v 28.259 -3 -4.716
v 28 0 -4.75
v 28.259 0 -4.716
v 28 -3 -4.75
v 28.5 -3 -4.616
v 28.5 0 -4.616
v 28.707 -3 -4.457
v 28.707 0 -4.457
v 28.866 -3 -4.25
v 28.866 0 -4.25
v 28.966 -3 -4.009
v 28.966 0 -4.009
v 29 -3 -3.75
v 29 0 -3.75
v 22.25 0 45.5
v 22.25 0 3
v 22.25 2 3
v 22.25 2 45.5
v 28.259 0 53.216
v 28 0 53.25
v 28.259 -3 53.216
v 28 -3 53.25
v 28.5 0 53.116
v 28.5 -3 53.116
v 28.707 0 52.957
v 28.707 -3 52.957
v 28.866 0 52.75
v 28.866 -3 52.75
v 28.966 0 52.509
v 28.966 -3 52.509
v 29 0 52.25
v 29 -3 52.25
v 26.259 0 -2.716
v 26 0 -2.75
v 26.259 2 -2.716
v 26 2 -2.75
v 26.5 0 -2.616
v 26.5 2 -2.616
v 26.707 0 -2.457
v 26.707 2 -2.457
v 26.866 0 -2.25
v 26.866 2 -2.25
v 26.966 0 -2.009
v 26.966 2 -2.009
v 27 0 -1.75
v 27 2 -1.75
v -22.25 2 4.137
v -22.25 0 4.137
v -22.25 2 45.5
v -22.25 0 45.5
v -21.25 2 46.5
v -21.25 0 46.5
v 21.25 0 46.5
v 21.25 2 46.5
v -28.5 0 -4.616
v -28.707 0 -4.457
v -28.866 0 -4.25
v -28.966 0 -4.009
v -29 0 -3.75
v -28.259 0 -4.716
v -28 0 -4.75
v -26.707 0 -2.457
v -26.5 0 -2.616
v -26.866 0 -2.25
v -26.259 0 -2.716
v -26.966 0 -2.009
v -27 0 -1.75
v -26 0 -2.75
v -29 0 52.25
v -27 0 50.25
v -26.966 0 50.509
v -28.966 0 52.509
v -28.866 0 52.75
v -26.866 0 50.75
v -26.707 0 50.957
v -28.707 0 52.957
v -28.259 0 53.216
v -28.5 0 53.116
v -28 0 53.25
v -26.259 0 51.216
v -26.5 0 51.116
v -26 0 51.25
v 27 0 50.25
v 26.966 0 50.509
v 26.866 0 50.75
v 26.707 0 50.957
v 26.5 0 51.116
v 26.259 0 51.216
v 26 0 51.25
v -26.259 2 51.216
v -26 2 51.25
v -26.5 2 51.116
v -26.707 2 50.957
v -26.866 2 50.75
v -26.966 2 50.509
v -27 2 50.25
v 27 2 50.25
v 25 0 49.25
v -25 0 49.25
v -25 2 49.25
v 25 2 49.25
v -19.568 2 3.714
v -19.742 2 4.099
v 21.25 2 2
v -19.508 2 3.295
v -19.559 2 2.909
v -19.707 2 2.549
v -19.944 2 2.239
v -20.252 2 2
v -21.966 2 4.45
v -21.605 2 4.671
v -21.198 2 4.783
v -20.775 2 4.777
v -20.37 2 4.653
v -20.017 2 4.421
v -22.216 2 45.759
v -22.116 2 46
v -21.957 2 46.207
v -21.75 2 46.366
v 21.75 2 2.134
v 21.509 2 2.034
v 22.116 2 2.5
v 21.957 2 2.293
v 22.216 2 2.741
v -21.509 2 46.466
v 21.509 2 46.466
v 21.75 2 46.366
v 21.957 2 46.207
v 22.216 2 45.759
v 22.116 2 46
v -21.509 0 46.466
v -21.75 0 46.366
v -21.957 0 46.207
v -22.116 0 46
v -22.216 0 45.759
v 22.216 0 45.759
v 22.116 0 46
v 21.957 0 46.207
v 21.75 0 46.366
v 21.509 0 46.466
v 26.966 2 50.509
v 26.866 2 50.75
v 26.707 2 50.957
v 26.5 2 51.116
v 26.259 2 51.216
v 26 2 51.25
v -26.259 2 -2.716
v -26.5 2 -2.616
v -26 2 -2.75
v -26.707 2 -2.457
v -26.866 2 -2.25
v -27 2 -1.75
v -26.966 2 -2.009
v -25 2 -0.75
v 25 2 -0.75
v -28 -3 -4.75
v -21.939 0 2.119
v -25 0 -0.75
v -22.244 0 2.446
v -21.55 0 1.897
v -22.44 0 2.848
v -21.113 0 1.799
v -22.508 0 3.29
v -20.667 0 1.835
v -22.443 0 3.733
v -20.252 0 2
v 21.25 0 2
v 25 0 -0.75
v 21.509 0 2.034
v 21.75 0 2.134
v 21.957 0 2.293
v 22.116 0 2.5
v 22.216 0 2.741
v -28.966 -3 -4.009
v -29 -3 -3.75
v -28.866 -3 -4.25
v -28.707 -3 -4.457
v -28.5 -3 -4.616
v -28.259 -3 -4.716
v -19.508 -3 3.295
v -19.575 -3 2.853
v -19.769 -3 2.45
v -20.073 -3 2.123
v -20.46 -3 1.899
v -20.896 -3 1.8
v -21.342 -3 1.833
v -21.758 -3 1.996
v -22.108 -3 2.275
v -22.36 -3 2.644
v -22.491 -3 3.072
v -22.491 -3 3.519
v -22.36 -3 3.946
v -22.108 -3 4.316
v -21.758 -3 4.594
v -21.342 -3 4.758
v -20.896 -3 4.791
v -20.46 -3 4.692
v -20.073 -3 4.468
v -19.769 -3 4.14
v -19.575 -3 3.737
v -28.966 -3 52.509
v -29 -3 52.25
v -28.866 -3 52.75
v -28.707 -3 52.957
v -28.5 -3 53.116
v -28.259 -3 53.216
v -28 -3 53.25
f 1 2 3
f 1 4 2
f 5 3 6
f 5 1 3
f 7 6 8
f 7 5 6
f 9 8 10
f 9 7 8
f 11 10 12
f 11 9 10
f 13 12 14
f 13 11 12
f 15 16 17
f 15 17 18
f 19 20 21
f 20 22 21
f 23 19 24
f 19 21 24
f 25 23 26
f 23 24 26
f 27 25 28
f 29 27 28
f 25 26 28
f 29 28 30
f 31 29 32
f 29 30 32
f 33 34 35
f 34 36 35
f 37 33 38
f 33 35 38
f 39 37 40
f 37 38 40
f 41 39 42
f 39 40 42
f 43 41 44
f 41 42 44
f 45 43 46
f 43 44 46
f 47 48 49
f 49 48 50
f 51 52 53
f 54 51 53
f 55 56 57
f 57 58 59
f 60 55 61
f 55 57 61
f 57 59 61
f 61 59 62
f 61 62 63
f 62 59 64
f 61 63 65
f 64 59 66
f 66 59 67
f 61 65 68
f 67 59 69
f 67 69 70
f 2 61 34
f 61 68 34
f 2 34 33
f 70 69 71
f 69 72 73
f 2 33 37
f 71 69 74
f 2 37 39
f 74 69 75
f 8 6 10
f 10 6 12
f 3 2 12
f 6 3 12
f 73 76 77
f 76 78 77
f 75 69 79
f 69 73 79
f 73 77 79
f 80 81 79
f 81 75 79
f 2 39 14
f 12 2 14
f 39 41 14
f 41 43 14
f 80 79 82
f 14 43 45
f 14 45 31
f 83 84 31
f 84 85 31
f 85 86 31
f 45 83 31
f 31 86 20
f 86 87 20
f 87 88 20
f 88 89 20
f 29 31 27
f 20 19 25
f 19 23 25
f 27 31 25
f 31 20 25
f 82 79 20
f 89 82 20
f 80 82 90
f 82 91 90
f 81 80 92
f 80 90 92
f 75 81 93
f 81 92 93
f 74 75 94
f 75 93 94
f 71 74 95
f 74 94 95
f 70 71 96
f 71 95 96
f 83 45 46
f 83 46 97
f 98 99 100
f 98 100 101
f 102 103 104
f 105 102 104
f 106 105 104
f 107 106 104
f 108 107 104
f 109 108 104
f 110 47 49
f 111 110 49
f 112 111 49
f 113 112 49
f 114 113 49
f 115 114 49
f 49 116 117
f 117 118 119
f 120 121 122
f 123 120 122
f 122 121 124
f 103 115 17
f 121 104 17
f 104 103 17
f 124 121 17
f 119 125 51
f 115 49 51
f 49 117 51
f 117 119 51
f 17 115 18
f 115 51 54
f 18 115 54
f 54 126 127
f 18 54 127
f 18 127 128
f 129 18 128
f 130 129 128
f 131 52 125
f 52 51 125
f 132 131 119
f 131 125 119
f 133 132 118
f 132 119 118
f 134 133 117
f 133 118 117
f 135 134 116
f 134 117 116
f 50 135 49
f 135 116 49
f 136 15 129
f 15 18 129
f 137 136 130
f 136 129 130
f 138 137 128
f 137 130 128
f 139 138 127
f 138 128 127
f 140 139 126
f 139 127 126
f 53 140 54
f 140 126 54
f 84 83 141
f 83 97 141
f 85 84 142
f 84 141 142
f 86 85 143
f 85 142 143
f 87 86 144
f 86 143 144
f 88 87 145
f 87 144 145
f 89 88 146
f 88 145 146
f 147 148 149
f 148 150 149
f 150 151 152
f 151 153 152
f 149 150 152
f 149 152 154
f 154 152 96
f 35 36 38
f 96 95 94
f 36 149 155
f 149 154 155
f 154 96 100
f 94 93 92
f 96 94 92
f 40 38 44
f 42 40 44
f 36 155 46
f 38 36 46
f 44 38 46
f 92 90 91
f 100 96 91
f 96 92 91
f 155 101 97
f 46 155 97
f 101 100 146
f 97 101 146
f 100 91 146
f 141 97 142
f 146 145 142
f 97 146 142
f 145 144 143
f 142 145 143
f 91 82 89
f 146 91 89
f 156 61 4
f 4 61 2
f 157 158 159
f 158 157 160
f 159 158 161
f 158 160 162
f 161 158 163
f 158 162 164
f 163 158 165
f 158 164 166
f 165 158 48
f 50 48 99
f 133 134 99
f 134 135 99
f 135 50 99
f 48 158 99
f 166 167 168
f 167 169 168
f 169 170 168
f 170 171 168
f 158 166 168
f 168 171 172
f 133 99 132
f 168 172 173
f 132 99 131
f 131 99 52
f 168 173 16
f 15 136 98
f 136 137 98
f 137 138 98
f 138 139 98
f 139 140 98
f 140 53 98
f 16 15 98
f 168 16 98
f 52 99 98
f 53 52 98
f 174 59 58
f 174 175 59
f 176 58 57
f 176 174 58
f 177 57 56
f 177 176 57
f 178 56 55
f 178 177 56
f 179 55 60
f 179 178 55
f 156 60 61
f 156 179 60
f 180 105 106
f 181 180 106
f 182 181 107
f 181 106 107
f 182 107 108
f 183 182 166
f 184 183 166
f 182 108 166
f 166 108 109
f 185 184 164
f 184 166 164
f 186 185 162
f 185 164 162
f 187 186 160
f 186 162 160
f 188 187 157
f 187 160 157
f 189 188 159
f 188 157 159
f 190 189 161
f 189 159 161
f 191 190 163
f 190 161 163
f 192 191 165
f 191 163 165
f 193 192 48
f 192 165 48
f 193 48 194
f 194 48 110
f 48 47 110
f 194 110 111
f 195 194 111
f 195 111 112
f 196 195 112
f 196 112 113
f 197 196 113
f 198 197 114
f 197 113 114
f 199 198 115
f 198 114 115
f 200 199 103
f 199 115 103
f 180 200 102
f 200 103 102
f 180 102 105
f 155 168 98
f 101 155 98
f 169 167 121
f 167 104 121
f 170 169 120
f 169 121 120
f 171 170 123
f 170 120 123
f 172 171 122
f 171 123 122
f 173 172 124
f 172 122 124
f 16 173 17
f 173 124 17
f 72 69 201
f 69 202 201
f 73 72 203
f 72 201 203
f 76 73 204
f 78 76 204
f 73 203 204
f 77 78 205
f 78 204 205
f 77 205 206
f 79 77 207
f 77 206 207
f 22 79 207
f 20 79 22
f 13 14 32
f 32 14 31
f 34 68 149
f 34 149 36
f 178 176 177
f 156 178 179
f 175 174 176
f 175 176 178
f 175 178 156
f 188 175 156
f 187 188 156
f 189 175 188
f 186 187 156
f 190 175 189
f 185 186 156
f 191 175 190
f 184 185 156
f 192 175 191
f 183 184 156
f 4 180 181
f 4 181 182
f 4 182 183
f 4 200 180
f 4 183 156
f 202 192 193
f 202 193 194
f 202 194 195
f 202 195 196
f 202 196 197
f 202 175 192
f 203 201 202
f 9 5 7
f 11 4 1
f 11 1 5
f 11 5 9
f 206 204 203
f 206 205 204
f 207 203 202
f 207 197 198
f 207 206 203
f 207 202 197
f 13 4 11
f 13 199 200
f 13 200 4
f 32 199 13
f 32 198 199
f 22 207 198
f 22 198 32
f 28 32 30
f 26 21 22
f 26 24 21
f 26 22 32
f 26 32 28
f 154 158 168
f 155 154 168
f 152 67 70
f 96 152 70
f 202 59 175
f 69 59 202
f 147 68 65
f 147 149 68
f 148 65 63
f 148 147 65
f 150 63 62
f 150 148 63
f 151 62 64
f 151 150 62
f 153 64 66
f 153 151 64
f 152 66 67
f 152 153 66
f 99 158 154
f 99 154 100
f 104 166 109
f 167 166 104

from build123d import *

# Parameters (mm, degrees)
SKETCH005_W   = 54
SKETCH005_H   = 54
SKETCH005_W_2 = 50
SKETCH005_H_2 = 50
SKETCH005_W_3 = 44.5
SKETCH005_H_3 = 44.5
PAD002_DEPTH  = 2
SKETCH006_W   = 58
SKETCH006_H   = 58
PAD003_DEPTH  = 3
FILLET_R      = 1
SKETCH007_R   = 1.5
POCKET_DEPTH  = 5.001


with BuildPart() as part:
    # Sketch005 → Pad002 (new body)
    with BuildSketch(Plane.XZ):
        with Locations((0, 24.25)):
            Rectangle(SKETCH005_W, SKETCH005_H)
        with Locations((0, 24.25)):
            Rectangle(SKETCH005_W_2, SKETCH005_H_2, mode=Mode.SUBTRACT)
        with Locations((0, 24.25)):
            Rectangle(SKETCH005_W_3, SKETCH005_H_3)
    extrude(amount=-PAD002_DEPTH)

    # Sketch006 (on Face15 of Pad002) → Pad003 (join)
    with BuildSketch(Plane.XZ):
        with Locations((0, 24.25)):
            Rectangle(SKETCH006_W, SKETCH006_H)
    extrude(amount=PAD003_DEPTH)

    # Fillet
    fillet_edges = [part.edges().sort_by_distance(p)[0] for p in [
        (-29, -1.5, 53.25),
        (-27, 1, 51.25),
        (-22.25, 1, 46.5),
        (22.25, 1, 46.5),
        (27, 1, 51.25),
        (29, -1.5, 53.25),
        (29, -1.5, -4.75),
        (27, 1, -2.75),
        (22.25, 1, 2),
        (-29, -1.5, -4.75),
        (-27, 1, -2.75),
        (-22.25, 1, 2),
    ]]
    fillet(fillet_edges, radius=FILLET_R)

    # Sketch007 (on Face33 of Fillet) → Pocket (cut, through all)
    with BuildSketch(Plane(origin=(0, 2, 0), x_dir=(1, 0, 0), z_dir=(0, 1, 0))):
        with Locations((-21.008142, -3.295312)):
            Circle(SKETCH007_R)
    extrude(amount=-POCKET_DEPTH, mode=Mode.SUBTRACT)


solid = part.part
